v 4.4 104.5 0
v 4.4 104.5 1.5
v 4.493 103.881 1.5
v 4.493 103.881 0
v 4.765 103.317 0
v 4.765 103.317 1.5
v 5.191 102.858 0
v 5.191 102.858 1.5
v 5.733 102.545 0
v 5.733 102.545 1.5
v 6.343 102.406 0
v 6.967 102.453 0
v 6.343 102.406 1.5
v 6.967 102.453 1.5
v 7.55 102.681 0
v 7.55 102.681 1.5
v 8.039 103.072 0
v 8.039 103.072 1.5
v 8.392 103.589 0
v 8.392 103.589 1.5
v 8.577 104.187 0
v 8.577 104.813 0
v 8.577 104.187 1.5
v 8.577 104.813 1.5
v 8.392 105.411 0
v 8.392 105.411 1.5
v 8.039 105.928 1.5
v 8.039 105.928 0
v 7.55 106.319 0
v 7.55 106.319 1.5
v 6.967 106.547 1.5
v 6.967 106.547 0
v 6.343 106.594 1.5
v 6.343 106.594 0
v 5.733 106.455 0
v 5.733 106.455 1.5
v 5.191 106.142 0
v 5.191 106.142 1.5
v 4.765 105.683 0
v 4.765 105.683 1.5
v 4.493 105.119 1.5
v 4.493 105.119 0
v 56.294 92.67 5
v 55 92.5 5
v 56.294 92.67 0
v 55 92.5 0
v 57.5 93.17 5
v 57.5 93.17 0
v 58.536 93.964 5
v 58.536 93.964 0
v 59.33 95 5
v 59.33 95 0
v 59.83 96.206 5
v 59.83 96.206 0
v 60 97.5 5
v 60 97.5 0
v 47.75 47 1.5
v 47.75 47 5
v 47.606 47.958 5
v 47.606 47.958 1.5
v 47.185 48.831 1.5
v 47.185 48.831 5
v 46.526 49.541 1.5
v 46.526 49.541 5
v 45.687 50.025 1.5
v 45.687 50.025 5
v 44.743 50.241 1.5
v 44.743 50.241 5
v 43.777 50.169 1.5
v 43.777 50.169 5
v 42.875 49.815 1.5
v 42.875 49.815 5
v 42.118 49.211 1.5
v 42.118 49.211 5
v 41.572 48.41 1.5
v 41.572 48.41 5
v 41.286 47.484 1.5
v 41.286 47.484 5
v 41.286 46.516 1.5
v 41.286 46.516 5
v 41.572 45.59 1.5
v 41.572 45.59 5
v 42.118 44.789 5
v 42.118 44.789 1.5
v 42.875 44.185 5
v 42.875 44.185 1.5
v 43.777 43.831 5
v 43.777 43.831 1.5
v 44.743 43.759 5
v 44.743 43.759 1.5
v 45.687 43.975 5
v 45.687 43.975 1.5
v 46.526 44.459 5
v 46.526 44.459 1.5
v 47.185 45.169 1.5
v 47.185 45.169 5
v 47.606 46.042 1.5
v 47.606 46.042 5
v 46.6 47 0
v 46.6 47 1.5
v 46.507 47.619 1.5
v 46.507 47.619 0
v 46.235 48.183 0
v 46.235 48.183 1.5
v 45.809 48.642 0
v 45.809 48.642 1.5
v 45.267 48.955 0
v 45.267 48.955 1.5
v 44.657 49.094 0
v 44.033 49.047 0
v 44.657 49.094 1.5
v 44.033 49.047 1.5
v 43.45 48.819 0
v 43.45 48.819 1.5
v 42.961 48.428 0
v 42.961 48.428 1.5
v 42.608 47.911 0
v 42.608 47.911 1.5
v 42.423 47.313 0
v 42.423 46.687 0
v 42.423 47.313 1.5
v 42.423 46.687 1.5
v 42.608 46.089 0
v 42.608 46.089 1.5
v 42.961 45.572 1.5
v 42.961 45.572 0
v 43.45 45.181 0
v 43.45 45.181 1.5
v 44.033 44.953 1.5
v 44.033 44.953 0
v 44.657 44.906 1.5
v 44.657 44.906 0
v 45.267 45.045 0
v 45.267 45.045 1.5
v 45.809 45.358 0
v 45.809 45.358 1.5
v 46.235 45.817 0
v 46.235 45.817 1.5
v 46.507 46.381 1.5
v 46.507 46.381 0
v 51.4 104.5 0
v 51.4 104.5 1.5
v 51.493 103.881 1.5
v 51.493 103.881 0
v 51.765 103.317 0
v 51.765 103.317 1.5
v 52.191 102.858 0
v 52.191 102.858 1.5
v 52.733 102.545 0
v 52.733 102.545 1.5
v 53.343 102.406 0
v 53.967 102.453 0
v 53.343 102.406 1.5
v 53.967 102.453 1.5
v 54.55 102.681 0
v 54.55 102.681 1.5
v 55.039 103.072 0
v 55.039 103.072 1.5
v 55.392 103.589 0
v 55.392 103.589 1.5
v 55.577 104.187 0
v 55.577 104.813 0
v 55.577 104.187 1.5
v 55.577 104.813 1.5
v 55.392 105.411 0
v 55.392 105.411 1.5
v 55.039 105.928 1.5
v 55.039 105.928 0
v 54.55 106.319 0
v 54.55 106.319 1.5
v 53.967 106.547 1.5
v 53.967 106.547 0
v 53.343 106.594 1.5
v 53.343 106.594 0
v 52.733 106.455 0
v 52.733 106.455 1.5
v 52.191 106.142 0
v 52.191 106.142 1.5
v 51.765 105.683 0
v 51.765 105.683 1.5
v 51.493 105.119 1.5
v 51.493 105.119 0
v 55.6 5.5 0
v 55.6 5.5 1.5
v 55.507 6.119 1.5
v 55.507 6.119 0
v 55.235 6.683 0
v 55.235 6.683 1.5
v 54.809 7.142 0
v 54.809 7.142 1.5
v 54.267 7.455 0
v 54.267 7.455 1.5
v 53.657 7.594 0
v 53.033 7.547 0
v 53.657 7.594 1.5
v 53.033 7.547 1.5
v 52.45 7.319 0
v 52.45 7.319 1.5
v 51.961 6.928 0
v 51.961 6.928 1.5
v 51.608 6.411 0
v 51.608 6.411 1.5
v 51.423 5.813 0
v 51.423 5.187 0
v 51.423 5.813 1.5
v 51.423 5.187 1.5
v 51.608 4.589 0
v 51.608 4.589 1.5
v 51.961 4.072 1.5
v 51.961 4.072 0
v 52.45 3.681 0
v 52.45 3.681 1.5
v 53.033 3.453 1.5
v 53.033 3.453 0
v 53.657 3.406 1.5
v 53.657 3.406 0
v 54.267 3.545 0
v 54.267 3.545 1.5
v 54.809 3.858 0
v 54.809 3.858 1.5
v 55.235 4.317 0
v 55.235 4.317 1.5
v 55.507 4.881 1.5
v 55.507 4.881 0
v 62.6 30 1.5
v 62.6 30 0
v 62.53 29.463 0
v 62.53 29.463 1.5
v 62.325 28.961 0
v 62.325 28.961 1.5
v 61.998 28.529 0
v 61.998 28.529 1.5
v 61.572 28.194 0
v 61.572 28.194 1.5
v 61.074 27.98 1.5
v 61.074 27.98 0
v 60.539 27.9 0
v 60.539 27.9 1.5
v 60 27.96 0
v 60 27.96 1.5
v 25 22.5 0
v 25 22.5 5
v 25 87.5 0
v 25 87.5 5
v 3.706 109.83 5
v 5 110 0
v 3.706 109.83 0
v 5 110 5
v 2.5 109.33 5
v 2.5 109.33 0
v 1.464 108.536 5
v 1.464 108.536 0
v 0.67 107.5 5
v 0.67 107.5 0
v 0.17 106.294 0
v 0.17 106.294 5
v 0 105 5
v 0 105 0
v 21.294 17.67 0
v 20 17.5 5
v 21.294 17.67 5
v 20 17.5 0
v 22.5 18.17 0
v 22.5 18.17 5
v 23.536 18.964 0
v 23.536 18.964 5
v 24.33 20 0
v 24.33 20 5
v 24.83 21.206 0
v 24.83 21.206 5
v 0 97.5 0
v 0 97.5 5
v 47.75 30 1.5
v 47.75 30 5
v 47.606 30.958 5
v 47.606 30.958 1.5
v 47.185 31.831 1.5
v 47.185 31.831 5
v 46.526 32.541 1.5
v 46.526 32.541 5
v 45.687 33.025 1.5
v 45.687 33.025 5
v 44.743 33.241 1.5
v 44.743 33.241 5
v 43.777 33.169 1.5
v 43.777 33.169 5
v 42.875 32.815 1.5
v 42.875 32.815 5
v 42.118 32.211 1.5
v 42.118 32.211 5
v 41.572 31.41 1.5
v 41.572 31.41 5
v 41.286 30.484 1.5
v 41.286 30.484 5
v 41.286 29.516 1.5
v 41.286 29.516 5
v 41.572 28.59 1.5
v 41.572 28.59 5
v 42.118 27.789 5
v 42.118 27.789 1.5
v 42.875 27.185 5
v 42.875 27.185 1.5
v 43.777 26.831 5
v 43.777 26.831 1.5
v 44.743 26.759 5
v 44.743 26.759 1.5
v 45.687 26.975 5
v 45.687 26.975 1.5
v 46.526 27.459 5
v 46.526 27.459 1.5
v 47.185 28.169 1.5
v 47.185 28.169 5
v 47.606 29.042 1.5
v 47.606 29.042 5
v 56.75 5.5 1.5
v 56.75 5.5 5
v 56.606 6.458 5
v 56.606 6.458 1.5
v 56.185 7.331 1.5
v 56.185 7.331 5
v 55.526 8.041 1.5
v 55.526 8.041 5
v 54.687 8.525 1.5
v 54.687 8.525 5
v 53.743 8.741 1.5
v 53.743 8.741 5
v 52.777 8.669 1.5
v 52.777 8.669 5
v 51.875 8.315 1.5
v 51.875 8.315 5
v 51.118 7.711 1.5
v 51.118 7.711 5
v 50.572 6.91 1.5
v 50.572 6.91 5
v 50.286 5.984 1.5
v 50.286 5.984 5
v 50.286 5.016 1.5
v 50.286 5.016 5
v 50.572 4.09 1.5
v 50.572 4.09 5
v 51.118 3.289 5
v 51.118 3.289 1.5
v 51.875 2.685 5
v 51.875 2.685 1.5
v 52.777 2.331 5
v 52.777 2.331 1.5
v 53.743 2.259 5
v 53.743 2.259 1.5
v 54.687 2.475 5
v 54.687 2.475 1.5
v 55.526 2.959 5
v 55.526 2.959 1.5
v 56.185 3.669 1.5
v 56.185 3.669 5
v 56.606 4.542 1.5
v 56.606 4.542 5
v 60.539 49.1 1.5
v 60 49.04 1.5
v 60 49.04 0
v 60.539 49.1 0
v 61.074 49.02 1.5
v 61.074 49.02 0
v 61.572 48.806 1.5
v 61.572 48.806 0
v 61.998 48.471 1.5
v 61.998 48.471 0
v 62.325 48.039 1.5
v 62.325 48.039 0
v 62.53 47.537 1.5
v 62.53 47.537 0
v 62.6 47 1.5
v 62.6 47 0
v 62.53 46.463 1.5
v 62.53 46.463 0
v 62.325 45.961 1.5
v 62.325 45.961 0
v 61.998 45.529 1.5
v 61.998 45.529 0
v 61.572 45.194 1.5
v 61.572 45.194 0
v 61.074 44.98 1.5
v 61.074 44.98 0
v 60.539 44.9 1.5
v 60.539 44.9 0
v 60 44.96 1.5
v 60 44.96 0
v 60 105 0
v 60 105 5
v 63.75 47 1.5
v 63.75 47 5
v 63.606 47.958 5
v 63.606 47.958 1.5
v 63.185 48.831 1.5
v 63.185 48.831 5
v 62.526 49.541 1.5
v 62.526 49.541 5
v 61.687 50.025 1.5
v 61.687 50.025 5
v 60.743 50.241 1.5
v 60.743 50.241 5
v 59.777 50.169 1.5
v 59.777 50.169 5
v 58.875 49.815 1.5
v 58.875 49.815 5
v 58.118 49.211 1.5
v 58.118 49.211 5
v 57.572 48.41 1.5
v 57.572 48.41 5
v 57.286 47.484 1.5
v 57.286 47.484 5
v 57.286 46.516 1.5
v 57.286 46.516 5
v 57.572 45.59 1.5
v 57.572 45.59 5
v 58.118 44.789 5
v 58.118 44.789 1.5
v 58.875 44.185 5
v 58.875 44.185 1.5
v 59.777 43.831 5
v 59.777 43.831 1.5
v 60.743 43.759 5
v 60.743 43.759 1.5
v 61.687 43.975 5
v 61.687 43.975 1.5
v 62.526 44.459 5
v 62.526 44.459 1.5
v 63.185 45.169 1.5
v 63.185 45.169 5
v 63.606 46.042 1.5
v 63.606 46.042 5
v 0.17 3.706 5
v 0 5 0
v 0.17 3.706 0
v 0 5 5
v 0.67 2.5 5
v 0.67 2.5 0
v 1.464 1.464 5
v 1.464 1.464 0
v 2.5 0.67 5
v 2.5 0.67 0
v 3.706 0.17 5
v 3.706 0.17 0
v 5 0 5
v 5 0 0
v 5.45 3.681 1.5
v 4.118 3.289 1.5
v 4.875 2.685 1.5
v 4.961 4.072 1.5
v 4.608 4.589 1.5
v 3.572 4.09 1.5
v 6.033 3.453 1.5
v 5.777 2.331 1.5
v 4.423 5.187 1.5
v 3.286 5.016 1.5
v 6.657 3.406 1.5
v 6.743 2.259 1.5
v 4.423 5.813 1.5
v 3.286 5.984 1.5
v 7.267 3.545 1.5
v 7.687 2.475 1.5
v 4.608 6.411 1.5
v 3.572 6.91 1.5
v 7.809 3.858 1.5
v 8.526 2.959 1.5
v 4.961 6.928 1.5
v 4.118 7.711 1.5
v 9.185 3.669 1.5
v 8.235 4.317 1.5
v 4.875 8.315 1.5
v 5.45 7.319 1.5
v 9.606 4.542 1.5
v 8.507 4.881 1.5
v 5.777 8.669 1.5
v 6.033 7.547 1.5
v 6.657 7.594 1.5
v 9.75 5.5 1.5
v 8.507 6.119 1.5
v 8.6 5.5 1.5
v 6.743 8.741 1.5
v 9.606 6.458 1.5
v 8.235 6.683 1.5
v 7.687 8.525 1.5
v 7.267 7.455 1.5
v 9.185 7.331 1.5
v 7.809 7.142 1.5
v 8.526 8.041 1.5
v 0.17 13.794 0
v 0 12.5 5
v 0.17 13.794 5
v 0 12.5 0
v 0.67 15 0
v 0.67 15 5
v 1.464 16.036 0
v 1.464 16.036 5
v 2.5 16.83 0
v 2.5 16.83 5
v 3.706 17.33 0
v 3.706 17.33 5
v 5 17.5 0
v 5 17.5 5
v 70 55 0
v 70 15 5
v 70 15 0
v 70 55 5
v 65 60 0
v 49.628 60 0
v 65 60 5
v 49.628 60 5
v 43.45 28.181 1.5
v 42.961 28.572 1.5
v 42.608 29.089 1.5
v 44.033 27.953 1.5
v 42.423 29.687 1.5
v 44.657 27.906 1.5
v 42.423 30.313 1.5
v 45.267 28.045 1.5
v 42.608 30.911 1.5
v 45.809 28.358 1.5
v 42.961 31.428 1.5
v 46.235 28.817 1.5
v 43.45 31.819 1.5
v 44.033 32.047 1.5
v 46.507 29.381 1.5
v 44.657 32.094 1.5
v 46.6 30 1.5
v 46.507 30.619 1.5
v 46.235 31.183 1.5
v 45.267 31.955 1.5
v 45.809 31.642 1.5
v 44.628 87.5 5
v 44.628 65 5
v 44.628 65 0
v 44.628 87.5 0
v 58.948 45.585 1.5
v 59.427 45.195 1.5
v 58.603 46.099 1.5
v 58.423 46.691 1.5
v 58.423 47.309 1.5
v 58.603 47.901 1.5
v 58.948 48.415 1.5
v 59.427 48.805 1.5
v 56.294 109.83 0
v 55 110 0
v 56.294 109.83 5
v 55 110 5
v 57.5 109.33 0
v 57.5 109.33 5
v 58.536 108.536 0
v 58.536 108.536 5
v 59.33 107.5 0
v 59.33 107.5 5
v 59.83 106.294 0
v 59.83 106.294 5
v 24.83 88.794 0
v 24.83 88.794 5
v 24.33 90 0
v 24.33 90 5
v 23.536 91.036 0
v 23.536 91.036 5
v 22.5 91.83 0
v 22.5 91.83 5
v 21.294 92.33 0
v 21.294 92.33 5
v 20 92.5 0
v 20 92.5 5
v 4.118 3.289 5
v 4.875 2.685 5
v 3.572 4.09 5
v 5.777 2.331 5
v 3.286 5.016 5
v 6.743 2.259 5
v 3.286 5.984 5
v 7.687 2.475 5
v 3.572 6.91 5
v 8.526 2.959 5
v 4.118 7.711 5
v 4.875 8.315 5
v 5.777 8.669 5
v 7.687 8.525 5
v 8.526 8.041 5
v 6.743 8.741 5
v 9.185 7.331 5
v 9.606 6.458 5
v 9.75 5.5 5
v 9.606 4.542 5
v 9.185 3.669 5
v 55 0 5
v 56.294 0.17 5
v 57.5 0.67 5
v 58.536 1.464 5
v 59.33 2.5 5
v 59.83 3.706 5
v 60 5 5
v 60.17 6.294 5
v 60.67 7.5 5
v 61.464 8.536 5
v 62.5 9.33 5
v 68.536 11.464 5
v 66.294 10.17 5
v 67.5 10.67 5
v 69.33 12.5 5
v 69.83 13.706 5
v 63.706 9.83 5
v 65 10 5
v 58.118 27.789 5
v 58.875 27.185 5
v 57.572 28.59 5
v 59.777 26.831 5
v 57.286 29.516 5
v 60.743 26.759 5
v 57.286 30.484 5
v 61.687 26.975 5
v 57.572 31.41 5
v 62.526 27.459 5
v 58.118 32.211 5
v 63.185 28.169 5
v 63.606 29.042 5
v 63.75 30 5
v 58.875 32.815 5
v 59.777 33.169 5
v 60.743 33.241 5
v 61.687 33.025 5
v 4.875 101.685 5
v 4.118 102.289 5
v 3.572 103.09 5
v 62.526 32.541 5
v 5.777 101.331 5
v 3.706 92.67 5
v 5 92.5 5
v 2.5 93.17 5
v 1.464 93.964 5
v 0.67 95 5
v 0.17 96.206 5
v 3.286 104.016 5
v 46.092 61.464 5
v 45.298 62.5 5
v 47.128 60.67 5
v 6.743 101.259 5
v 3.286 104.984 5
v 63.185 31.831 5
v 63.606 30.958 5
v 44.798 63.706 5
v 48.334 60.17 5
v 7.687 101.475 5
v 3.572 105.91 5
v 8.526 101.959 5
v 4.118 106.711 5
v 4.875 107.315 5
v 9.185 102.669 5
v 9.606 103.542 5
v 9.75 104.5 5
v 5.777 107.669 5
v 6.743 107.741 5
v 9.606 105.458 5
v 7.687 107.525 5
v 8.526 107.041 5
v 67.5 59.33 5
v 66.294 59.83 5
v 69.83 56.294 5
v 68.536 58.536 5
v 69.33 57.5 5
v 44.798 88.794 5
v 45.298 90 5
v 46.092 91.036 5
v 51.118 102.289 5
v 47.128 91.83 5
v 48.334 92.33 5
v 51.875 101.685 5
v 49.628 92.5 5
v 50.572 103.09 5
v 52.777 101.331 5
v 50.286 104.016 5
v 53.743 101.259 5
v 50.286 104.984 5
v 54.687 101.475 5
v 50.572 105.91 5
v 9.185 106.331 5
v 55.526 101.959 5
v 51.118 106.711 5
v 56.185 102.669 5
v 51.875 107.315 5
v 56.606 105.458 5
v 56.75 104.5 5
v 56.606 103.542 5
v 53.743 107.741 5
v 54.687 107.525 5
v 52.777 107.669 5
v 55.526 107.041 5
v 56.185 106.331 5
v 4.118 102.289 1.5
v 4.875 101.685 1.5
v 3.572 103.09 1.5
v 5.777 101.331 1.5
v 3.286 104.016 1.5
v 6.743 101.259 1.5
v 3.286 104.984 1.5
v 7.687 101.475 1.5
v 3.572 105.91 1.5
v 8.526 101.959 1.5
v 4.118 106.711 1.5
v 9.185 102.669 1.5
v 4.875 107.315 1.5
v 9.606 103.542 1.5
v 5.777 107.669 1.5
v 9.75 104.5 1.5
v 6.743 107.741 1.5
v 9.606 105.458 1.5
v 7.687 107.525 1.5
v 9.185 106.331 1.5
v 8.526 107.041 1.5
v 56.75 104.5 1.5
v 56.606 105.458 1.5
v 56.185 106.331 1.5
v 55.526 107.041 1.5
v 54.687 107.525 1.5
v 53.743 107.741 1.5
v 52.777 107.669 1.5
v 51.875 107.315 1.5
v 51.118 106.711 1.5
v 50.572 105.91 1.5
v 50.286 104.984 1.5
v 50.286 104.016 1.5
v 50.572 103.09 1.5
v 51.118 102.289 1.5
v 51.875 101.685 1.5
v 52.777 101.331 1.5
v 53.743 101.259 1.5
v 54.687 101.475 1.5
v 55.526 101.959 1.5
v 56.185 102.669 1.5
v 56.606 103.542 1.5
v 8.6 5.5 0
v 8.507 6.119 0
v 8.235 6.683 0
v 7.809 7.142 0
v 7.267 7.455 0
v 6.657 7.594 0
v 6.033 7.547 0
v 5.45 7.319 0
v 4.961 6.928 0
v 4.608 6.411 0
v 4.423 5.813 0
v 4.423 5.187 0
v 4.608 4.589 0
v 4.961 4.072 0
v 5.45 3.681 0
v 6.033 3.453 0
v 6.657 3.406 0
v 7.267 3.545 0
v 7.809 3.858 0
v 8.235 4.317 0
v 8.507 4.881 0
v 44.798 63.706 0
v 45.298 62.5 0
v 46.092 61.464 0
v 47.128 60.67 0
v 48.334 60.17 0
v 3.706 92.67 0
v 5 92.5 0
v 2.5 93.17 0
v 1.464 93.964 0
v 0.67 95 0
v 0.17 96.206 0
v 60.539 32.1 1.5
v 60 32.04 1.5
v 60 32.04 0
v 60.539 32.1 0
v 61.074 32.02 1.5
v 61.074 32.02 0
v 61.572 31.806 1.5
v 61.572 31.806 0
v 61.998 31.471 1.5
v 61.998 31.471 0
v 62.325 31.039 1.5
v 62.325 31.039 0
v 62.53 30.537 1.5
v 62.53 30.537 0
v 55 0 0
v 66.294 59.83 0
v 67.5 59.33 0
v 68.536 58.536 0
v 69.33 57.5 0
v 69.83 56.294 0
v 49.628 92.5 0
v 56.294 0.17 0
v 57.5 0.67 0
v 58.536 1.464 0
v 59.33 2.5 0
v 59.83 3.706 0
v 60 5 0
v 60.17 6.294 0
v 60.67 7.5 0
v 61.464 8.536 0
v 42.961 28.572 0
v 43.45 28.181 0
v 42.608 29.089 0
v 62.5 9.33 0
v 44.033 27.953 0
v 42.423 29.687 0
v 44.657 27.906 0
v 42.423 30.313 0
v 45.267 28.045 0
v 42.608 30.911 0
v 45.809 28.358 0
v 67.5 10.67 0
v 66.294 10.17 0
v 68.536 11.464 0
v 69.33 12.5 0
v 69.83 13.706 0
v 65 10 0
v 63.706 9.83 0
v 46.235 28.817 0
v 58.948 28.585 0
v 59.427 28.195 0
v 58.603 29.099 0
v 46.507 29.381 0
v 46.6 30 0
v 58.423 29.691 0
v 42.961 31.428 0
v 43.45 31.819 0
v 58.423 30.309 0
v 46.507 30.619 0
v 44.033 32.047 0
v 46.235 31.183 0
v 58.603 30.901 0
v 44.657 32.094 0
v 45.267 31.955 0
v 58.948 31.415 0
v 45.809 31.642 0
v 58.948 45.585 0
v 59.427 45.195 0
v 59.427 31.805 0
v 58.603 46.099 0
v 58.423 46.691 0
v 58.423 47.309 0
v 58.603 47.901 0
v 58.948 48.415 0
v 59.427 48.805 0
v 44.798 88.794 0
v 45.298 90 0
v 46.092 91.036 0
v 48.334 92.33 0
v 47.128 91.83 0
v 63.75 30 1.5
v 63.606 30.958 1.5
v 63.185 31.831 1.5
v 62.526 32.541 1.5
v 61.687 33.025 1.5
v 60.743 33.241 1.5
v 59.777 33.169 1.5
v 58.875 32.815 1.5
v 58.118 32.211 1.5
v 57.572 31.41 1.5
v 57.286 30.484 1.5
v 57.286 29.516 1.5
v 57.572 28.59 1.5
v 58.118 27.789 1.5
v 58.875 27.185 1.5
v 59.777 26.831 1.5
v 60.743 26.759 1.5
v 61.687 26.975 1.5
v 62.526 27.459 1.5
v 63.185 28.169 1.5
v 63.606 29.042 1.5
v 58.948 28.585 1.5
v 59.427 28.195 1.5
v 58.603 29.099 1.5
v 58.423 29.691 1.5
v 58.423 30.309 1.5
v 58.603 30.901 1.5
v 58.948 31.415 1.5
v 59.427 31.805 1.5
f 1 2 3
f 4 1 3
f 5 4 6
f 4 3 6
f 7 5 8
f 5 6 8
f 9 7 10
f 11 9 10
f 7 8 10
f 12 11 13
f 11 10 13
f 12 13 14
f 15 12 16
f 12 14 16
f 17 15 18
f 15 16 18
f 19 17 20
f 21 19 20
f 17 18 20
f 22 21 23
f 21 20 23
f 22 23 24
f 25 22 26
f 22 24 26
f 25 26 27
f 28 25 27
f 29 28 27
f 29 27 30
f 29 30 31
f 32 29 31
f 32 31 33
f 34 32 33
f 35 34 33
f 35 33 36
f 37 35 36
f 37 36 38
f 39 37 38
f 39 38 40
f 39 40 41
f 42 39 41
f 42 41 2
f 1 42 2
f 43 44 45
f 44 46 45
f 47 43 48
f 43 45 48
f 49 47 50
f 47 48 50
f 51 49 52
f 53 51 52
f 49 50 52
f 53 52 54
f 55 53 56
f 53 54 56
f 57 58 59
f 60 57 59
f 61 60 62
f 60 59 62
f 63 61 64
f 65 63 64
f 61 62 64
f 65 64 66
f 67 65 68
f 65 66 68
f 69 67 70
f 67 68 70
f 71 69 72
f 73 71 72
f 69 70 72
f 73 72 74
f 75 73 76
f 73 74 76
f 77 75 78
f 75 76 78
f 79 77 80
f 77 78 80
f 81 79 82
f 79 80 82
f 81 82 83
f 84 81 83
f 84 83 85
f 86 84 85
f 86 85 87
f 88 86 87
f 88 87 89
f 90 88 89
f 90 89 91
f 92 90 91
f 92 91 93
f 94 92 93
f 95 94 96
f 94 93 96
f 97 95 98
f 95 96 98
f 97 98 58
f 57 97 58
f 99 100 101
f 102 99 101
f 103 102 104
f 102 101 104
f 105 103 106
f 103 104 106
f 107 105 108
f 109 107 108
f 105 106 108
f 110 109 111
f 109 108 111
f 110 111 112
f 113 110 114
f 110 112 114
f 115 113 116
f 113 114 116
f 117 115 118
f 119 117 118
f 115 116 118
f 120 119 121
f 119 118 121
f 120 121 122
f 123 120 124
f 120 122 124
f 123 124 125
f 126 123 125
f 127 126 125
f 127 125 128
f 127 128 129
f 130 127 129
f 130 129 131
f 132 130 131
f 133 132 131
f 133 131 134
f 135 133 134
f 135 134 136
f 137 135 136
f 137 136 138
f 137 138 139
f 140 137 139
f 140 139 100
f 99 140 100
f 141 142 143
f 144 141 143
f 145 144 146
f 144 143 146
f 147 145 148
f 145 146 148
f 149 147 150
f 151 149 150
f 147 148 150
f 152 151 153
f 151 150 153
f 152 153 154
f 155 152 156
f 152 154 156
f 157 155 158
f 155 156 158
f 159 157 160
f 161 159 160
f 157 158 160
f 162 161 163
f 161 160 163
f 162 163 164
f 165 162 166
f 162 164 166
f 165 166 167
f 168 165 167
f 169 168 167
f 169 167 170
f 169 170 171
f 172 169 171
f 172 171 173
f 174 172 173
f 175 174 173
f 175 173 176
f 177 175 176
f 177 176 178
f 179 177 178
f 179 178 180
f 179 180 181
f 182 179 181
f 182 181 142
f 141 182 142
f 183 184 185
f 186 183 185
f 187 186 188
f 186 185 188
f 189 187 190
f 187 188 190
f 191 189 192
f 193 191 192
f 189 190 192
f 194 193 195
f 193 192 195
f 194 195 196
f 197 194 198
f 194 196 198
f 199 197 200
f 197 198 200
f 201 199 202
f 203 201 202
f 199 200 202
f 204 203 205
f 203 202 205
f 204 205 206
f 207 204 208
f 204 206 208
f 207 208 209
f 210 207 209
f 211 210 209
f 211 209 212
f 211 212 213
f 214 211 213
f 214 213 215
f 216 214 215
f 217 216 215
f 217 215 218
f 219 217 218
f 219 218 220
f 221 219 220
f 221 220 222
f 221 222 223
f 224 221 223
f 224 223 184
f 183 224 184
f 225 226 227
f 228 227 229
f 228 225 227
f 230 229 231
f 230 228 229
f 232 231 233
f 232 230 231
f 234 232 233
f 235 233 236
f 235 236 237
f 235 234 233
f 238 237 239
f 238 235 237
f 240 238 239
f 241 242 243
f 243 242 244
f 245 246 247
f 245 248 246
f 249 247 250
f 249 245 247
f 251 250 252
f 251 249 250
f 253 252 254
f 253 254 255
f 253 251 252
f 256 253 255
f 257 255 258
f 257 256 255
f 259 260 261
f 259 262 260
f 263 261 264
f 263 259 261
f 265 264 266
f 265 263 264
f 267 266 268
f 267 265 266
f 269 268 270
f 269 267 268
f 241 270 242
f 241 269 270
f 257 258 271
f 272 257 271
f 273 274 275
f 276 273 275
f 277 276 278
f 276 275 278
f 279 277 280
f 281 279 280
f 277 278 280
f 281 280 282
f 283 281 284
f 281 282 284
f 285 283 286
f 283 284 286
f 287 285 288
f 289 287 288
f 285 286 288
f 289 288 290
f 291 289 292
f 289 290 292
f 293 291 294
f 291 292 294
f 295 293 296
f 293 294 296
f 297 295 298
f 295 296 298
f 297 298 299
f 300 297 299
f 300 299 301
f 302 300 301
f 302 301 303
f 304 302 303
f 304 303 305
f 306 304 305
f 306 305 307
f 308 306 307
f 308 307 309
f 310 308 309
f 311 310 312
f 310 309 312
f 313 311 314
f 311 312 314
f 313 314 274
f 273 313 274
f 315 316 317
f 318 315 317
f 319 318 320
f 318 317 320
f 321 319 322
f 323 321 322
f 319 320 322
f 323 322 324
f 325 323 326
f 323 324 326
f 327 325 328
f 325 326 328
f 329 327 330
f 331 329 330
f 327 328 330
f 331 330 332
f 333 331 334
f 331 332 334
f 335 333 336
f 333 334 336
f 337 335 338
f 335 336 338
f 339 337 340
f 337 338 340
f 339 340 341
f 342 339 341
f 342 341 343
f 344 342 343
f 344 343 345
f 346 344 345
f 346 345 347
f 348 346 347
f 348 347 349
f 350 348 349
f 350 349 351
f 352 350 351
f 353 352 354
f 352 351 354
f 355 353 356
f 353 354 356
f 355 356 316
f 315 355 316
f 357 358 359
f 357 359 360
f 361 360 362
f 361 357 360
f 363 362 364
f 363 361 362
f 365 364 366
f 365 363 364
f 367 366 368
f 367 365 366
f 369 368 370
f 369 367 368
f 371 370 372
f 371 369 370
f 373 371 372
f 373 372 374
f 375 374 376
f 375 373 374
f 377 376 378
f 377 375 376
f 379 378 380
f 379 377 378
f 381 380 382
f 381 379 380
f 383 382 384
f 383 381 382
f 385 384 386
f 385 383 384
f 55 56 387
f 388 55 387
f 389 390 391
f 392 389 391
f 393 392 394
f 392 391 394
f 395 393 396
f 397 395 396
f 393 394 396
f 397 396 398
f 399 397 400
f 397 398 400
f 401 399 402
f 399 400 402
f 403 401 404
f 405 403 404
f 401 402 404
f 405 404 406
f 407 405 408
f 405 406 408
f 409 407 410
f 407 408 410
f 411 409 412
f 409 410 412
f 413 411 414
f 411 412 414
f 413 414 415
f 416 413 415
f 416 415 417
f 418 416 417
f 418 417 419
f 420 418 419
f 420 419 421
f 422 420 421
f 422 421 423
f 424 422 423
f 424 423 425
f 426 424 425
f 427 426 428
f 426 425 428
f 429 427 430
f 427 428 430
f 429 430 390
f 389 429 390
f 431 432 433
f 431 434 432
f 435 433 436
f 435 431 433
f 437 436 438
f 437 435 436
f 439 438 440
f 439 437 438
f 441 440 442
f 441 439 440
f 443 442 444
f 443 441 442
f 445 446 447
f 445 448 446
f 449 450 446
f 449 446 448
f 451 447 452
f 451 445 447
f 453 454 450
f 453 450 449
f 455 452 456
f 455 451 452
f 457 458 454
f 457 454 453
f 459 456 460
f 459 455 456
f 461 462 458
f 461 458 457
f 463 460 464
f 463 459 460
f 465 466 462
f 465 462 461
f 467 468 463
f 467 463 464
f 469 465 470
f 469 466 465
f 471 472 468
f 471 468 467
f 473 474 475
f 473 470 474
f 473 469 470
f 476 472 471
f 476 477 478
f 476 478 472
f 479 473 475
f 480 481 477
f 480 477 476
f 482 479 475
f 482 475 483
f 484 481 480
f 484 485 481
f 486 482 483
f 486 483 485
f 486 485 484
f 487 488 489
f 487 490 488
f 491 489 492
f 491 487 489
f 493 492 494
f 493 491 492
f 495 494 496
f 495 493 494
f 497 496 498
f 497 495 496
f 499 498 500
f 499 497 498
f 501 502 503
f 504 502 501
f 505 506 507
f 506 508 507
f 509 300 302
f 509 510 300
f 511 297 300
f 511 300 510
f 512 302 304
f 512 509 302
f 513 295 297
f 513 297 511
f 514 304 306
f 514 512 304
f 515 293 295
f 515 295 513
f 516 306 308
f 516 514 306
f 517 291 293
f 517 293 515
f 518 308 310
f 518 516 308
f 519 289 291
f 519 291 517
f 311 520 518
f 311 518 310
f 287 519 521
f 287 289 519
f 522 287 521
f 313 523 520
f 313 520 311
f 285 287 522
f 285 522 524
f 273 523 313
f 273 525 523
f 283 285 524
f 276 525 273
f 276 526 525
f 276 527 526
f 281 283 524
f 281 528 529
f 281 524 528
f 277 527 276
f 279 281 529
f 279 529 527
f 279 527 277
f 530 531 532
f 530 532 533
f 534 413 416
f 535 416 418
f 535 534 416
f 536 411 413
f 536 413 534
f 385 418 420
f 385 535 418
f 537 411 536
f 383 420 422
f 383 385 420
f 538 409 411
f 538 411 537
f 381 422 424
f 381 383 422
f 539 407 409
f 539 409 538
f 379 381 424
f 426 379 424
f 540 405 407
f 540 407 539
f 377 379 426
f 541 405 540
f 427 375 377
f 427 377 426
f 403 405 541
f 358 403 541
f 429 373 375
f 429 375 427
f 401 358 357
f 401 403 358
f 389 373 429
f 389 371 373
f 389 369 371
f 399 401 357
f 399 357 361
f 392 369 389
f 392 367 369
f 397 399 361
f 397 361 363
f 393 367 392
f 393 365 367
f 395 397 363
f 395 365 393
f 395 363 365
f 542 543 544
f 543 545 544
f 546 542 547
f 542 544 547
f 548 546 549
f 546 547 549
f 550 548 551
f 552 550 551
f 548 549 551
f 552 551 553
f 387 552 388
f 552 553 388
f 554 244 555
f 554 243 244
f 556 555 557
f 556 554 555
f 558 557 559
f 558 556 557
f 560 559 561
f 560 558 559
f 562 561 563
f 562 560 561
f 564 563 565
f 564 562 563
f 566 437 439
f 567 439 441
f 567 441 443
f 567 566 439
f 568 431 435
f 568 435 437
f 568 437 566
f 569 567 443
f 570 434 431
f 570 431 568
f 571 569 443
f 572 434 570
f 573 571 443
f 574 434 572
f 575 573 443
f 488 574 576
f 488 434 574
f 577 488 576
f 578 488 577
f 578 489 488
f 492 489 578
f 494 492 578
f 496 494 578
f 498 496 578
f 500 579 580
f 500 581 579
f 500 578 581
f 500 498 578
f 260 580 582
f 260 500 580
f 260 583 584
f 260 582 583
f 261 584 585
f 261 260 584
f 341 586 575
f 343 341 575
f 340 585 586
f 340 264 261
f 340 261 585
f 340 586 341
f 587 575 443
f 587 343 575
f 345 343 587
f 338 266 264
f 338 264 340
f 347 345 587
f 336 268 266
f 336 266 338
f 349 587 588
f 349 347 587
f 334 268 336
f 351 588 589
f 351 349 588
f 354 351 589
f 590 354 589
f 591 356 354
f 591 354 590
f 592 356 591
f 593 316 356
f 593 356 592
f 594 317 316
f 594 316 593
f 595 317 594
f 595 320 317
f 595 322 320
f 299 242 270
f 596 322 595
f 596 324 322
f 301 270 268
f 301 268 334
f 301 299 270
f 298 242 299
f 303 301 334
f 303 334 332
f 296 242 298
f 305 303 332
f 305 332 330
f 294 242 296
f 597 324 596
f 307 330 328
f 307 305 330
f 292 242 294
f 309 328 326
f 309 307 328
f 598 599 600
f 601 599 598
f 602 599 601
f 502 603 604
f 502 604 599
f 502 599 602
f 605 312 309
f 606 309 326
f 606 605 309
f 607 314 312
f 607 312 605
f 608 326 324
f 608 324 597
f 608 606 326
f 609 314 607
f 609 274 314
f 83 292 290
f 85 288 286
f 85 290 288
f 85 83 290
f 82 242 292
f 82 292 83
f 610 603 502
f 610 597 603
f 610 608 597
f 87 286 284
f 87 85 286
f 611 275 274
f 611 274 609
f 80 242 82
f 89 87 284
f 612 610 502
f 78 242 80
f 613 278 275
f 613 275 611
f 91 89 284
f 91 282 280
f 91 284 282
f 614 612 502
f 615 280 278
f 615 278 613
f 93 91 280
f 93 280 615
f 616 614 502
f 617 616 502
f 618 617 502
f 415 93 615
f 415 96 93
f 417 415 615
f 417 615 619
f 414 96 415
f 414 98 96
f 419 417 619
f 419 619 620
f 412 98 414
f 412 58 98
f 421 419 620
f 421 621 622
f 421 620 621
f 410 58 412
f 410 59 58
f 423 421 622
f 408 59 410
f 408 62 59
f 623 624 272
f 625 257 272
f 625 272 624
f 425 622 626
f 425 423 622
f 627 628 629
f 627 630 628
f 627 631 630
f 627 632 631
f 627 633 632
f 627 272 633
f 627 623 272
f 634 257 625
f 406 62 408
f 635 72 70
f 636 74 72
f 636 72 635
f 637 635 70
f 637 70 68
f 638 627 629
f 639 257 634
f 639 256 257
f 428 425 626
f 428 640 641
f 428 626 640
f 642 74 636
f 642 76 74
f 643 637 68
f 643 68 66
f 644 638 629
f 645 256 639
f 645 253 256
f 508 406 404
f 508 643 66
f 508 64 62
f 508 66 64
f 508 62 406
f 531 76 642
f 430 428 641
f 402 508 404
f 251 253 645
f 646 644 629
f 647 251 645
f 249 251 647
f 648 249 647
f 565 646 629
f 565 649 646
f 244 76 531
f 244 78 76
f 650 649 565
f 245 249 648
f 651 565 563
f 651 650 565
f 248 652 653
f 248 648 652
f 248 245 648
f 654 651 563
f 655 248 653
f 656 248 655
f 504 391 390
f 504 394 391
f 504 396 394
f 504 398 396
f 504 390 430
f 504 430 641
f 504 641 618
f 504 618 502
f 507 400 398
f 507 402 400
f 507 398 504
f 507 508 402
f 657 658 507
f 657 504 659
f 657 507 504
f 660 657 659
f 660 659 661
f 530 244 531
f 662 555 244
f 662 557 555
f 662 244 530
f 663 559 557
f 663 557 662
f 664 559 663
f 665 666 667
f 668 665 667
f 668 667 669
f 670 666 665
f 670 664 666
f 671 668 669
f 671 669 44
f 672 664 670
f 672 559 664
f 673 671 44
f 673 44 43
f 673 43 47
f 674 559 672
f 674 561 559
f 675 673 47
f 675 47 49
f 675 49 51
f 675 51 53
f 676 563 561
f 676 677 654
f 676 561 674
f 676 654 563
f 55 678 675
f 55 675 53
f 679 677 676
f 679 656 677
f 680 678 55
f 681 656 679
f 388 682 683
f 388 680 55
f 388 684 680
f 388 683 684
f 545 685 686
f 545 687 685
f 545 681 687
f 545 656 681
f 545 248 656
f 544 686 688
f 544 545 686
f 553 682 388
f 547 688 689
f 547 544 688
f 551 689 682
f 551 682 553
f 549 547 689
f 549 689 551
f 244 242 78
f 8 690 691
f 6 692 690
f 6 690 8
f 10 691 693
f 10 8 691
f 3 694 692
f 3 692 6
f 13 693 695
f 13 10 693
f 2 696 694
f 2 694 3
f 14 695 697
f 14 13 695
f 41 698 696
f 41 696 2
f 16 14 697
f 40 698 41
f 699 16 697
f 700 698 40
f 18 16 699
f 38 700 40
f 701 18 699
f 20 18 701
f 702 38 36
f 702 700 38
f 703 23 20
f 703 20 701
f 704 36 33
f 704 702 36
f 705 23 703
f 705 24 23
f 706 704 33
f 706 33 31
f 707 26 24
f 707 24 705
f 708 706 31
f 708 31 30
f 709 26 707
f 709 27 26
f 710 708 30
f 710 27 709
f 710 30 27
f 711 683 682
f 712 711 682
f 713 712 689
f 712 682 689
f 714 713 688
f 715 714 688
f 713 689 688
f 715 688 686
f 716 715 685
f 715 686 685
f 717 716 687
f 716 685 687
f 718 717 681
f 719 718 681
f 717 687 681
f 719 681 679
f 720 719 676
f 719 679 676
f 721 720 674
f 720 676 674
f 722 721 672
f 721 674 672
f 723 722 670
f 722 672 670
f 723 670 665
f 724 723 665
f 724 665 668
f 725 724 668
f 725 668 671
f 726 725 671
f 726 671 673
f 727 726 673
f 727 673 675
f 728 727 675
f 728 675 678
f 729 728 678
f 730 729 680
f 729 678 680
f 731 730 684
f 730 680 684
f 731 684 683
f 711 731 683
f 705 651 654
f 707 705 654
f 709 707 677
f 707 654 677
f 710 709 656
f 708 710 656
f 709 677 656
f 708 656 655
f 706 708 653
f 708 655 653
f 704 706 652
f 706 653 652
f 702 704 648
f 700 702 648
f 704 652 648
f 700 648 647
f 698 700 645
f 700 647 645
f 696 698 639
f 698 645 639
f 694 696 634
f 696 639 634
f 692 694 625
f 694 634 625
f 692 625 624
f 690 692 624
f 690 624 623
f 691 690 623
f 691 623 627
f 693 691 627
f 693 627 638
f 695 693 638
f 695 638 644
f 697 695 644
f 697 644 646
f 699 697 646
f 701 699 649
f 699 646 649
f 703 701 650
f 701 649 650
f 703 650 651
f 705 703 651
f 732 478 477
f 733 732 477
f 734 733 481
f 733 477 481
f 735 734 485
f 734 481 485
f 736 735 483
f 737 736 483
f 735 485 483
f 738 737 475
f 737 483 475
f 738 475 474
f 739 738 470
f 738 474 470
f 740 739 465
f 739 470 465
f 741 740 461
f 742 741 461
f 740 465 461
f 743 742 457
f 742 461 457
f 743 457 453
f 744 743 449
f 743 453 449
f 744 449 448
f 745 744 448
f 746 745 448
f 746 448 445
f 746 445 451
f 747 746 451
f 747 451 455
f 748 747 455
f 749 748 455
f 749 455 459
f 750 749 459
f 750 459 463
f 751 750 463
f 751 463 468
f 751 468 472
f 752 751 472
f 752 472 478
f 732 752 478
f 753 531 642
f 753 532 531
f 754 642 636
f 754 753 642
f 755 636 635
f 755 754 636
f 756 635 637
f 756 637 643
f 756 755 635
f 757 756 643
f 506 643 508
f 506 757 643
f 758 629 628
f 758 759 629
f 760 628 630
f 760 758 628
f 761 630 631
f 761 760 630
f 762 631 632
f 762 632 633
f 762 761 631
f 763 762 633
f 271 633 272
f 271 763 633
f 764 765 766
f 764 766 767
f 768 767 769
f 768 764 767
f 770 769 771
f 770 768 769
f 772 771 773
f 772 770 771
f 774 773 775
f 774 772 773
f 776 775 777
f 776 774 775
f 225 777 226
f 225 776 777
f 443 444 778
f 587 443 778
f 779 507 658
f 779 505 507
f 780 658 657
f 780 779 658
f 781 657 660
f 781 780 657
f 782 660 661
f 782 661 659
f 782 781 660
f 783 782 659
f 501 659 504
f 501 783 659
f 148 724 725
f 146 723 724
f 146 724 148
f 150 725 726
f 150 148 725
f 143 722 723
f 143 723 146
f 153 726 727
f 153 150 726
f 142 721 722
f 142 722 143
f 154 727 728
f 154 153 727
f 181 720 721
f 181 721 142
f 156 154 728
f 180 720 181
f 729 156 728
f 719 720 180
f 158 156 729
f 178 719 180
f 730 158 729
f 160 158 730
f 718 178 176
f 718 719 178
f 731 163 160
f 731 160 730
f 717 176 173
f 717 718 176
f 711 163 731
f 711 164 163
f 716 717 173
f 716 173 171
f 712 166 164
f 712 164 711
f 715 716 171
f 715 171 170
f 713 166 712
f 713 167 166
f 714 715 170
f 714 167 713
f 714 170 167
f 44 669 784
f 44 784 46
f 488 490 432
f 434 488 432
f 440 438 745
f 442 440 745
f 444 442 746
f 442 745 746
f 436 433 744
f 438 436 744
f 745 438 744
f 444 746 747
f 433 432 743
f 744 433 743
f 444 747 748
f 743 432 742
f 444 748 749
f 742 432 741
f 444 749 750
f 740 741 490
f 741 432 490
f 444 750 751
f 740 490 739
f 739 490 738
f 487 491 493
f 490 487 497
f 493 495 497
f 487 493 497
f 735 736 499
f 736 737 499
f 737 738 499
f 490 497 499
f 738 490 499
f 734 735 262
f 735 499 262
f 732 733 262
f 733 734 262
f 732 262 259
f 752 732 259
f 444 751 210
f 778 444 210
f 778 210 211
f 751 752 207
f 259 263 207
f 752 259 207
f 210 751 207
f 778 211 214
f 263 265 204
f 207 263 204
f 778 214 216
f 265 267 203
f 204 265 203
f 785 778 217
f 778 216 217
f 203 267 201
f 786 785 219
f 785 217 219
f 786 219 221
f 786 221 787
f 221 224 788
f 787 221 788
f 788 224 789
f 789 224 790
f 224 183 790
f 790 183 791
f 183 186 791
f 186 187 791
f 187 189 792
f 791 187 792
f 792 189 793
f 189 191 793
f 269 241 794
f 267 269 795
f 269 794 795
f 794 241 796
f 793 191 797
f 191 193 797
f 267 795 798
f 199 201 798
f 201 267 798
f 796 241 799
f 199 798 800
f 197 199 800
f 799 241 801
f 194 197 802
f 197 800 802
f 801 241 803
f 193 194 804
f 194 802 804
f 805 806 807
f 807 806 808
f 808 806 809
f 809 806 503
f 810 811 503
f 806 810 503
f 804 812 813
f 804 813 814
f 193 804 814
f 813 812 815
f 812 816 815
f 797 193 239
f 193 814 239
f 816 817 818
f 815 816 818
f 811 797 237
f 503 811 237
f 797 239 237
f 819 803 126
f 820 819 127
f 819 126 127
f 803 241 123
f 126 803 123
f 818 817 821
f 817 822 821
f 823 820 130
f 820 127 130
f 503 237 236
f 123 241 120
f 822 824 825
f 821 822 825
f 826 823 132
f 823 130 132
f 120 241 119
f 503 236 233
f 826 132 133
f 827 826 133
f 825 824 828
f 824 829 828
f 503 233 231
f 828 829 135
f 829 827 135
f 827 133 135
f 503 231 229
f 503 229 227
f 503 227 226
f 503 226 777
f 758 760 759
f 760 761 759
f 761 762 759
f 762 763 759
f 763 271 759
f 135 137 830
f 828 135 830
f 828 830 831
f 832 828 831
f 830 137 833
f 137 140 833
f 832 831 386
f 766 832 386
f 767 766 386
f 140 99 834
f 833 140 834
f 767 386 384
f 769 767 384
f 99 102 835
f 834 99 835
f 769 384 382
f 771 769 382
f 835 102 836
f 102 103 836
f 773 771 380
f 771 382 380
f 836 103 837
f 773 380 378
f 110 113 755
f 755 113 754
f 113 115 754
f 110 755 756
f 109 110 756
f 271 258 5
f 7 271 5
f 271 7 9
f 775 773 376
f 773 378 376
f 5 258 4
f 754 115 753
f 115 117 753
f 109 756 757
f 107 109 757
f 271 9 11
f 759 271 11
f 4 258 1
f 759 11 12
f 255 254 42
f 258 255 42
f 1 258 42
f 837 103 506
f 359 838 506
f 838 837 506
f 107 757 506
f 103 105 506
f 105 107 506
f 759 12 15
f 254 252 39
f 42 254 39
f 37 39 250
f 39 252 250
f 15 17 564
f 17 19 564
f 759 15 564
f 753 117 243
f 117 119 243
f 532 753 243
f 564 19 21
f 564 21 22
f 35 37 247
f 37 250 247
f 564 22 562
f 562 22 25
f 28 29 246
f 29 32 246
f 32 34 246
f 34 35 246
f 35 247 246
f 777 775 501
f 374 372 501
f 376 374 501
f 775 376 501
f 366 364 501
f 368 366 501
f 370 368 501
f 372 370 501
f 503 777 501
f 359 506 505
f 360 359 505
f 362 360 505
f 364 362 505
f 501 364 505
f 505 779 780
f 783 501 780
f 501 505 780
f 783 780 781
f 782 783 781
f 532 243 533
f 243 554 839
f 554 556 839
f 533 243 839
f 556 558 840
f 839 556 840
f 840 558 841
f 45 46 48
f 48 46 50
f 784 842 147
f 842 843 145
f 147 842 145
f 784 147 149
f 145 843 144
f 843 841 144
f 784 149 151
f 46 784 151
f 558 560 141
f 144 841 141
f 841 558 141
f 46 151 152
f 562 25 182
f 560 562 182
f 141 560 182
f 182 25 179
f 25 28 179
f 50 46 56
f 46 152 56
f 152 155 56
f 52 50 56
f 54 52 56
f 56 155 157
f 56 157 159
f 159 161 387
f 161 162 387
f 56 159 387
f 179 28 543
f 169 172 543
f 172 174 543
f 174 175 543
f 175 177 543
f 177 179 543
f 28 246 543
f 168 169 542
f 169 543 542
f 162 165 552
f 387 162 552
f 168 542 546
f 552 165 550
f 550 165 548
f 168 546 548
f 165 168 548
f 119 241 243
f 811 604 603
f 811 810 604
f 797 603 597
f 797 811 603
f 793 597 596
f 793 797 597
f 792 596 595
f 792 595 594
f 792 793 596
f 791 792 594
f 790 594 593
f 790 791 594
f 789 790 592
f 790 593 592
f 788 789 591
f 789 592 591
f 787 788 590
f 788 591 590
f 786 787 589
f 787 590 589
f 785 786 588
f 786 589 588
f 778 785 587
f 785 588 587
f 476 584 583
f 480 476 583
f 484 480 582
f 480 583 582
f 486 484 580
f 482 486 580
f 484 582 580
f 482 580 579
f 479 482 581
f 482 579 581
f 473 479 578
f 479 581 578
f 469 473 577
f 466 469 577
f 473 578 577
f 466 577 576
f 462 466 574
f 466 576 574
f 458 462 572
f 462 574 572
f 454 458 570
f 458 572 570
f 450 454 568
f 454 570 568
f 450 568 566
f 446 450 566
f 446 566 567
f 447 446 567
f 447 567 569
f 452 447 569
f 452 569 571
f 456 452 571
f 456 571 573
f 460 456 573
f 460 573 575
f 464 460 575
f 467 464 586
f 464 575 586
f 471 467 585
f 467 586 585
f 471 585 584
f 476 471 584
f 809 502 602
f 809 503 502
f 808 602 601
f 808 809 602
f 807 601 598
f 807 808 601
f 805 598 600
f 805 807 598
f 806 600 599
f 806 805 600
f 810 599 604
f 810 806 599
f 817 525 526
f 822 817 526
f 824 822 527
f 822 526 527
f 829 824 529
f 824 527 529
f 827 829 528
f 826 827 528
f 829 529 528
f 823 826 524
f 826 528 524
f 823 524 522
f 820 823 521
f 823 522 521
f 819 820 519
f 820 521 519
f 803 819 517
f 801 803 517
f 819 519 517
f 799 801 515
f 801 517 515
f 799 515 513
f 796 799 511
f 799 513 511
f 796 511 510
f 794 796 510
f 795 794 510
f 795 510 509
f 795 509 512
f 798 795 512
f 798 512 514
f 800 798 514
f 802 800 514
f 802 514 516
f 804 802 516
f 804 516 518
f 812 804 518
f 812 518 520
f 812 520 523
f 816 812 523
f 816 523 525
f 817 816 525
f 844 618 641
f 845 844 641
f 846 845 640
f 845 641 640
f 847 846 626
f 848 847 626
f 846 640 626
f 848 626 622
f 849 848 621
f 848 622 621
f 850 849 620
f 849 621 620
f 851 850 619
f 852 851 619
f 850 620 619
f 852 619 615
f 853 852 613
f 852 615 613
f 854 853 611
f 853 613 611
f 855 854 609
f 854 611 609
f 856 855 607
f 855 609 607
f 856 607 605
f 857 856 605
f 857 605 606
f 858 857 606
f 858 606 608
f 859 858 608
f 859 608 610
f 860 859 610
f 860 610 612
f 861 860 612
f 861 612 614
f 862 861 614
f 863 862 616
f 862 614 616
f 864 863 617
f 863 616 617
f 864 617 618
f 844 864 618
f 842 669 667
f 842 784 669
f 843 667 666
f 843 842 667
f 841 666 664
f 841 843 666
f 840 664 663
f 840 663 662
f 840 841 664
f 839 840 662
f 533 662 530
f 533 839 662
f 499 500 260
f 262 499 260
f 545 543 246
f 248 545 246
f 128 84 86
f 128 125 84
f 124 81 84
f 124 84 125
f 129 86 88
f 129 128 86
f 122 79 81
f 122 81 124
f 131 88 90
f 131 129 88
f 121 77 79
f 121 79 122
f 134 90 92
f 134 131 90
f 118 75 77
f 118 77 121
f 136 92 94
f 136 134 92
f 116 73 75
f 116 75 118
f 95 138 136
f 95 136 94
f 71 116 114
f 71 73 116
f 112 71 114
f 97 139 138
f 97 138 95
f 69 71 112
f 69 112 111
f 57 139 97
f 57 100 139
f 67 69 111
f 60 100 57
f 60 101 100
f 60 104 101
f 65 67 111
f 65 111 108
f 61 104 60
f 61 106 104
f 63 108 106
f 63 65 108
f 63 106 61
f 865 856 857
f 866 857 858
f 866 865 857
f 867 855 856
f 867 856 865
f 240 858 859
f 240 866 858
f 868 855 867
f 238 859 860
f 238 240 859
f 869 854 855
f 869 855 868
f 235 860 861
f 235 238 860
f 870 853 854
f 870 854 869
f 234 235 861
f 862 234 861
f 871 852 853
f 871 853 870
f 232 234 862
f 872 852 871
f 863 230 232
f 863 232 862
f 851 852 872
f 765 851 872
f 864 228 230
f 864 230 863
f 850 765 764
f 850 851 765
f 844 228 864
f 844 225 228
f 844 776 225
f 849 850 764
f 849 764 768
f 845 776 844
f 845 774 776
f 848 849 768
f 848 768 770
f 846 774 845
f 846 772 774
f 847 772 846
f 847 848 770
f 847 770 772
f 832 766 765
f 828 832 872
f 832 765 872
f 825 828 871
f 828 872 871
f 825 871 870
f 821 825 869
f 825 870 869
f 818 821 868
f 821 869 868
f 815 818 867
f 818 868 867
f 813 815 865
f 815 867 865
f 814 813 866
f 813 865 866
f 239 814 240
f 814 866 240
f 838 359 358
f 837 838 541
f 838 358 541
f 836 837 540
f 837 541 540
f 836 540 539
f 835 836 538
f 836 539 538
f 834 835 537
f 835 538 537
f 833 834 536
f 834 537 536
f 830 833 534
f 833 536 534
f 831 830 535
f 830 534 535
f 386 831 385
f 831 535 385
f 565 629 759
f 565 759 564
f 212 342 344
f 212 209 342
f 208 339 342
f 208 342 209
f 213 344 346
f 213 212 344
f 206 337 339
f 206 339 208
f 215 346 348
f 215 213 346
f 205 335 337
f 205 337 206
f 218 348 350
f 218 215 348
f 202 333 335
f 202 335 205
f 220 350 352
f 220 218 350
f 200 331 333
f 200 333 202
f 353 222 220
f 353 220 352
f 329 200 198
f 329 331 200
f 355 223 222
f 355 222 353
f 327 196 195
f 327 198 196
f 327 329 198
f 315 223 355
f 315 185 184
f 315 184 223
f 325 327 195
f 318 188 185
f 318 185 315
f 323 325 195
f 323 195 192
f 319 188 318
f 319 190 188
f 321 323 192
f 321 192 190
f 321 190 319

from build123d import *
from build123d.topology import SkipClean

# Parameters (mm, degrees)
BOSS_EXTRUDE1_DEPTH = 5
SKETCH3_R           = 2.1
CUT_EXTRUDE1_DEPTH  = 10
BOSS_EXTRUDE2_DEPTH = 5
SKETCH4_3_R         = 2.1
CUT_EXTRUDE2_DEPTH  = 5
FILLET1_R           = 5
SKETCH5_W           = 25
SKETCH5_H           = 75
SKETCH5_W_2         = 15.371996706
SKETCH5_H_2         = 32.5
CUT_EXTRUDE3_DEPTH  = 5
FILLET2_R           = 5
SKETCH6_R           = 3.25
CUT_EXTRUDE4_DEPTH  = 3.5


with BuildPart() as part:
    # Sketch1 → Boss-Extrude1 (new body)
    with BuildSketch(Plane.XY):
        Polygon((60, 40), (60, 110), (0, 110), (0, 0), (60, 0), align=None)
    extrude(amount=BOSS_EXTRUDE1_DEPTH)

    # Sketch3 → Cut-Extrude1 (cut)
    with BuildSketch(Plane.XY.offset(5)):
        with Locations((6.5, 5.5)):
            Circle(SKETCH3_R)
        with Locations((53.5, 5.5)):
            Circle(SKETCH3_R)
        with Locations(Location((53.5, 104.5, 0), (0, 0, 180))):
            Circle(SKETCH3_R)
        with Locations(Location((6.5, 104.5, 0), (0, 0, 180))):
            Circle(SKETCH3_R)
    extrude(amount=-CUT_EXTRUDE1_DEPTH, mode=Mode.SUBTRACT)

    # Sketch4 → Boss-Extrude2 (add)
    with BuildSketch(Plane.XY.offset(5)):
        with BuildLine():
            Line((70, 60), (60, 60))
            Line((60, 60), (60, 49.039607805))
            ThreePointArc((60, 49.039607805), (61.79614814, 48.652271164), (62.6, 47))
            ThreePointArc((62.6, 47), (61.79614814, 45.347728836), (60, 44.960392195))
            Line((60, 44.960392195), (60, 32.039607805))
            ThreePointArc((60, 32.039607805), (61.79614814, 31.652271164), (62.6, 30))
            ThreePointArc((62.6, 30), (61.79614814, 28.347728836), (60, 27.960392195))
            Line((60, 27.960392195), (60, 10))
            Line((60, 10), (70, 10))
            Line((70, 10), (70, 60))
        make_face()
    extrude(amount=-BOSS_EXTRUDE2_DEPTH)

    # Sketch4<3> → Cut-Extrude2 (cut)
    with SkipClean():  # the faces are left unmerged after this step: merging them gives an invalid solid
        with BuildSketch(Plane.XY.offset(5)):
            with Locations((60.5, 30)):
                Circle(SKETCH4_3_R)
            with Locations((44.5, 30)):
                Circle(SKETCH4_3_R)
            with Locations((44.5, 47)):
                Circle(SKETCH4_3_R)
            with Locations((60.5, 47)):
                Circle(SKETCH4_3_R)
        extrude(amount=-CUT_EXTRUDE2_DEPTH, mode=Mode.SUBTRACT)

    # Fillet1
    fillet1_edges = [part.edges().sort_by_distance(p)[0] for p in [
        (0, 110, 2.5),
        (0, 0, 2.5),
    ]]
    fillet(fillet1_edges, radius=FILLET1_R)

    # Sketch5 → Cut-Extrude3 (cut)
    with BuildSketch(Plane.XY.offset(5)):
        with Locations((12.5, 55)):
            Rectangle(SKETCH5_W, SKETCH5_H)
        with Locations((52.314001647, 76.25)):
            Rectangle(SKETCH5_W_2, SKETCH5_H_2)
    extrude(amount=-CUT_EXTRUDE3_DEPTH, mode=Mode.SUBTRACT)

    # Fillet2
    fillet2_edges = [part.edges().sort_by_distance(p)[0] for p in [
        (60, 0, 2.5),
        (60, 10, 2.5),
        (70, 10, 2.5),
        (70, 60, 2.5),
        (60, 92.5, 2.5),
        (60, 110, 2.5),
        (44.628003294, 92.5, 2.5),
        (44.628003294, 60, 2.5),
        (0, 17.5, 2.5),
        (25, 17.5, 2.5),
        (25, 92.5, 2.5),
        (0, 92.5, 2.5),
    ]]
    fillet(fillet2_edges, radius=FILLET2_R - 0.0001)  # a hair under: the kernel refuses the full size

    # Sketch6 → Cut-Extrude4 (cut)
    with BuildSketch(Plane.XY.offset(5)):
        with Locations((44.5, 47)):
            Circle(SKETCH6_R)
        with Locations((60.5, 47)):
            Circle(SKETCH6_R)
        with Locations((60.5, 30)):
            Circle(SKETCH6_R)
        with Locations((44.5, 30)):
            Circle(SKETCH6_R)
        with Locations((53.5, 5.5)):
            Circle(SKETCH6_R)
        with Locations((6.5, 5.5)):
            Circle(SKETCH6_R)
        with Locations((6.5, 104.5)):
            Circle(SKETCH6_R)
        with Locations((53.5, 104.5)):
            Circle(SKETCH6_R)
    extrude(amount=-CUT_EXTRUDE4_DEPTH, mode=Mode.SUBTRACT)


solid = part.part
